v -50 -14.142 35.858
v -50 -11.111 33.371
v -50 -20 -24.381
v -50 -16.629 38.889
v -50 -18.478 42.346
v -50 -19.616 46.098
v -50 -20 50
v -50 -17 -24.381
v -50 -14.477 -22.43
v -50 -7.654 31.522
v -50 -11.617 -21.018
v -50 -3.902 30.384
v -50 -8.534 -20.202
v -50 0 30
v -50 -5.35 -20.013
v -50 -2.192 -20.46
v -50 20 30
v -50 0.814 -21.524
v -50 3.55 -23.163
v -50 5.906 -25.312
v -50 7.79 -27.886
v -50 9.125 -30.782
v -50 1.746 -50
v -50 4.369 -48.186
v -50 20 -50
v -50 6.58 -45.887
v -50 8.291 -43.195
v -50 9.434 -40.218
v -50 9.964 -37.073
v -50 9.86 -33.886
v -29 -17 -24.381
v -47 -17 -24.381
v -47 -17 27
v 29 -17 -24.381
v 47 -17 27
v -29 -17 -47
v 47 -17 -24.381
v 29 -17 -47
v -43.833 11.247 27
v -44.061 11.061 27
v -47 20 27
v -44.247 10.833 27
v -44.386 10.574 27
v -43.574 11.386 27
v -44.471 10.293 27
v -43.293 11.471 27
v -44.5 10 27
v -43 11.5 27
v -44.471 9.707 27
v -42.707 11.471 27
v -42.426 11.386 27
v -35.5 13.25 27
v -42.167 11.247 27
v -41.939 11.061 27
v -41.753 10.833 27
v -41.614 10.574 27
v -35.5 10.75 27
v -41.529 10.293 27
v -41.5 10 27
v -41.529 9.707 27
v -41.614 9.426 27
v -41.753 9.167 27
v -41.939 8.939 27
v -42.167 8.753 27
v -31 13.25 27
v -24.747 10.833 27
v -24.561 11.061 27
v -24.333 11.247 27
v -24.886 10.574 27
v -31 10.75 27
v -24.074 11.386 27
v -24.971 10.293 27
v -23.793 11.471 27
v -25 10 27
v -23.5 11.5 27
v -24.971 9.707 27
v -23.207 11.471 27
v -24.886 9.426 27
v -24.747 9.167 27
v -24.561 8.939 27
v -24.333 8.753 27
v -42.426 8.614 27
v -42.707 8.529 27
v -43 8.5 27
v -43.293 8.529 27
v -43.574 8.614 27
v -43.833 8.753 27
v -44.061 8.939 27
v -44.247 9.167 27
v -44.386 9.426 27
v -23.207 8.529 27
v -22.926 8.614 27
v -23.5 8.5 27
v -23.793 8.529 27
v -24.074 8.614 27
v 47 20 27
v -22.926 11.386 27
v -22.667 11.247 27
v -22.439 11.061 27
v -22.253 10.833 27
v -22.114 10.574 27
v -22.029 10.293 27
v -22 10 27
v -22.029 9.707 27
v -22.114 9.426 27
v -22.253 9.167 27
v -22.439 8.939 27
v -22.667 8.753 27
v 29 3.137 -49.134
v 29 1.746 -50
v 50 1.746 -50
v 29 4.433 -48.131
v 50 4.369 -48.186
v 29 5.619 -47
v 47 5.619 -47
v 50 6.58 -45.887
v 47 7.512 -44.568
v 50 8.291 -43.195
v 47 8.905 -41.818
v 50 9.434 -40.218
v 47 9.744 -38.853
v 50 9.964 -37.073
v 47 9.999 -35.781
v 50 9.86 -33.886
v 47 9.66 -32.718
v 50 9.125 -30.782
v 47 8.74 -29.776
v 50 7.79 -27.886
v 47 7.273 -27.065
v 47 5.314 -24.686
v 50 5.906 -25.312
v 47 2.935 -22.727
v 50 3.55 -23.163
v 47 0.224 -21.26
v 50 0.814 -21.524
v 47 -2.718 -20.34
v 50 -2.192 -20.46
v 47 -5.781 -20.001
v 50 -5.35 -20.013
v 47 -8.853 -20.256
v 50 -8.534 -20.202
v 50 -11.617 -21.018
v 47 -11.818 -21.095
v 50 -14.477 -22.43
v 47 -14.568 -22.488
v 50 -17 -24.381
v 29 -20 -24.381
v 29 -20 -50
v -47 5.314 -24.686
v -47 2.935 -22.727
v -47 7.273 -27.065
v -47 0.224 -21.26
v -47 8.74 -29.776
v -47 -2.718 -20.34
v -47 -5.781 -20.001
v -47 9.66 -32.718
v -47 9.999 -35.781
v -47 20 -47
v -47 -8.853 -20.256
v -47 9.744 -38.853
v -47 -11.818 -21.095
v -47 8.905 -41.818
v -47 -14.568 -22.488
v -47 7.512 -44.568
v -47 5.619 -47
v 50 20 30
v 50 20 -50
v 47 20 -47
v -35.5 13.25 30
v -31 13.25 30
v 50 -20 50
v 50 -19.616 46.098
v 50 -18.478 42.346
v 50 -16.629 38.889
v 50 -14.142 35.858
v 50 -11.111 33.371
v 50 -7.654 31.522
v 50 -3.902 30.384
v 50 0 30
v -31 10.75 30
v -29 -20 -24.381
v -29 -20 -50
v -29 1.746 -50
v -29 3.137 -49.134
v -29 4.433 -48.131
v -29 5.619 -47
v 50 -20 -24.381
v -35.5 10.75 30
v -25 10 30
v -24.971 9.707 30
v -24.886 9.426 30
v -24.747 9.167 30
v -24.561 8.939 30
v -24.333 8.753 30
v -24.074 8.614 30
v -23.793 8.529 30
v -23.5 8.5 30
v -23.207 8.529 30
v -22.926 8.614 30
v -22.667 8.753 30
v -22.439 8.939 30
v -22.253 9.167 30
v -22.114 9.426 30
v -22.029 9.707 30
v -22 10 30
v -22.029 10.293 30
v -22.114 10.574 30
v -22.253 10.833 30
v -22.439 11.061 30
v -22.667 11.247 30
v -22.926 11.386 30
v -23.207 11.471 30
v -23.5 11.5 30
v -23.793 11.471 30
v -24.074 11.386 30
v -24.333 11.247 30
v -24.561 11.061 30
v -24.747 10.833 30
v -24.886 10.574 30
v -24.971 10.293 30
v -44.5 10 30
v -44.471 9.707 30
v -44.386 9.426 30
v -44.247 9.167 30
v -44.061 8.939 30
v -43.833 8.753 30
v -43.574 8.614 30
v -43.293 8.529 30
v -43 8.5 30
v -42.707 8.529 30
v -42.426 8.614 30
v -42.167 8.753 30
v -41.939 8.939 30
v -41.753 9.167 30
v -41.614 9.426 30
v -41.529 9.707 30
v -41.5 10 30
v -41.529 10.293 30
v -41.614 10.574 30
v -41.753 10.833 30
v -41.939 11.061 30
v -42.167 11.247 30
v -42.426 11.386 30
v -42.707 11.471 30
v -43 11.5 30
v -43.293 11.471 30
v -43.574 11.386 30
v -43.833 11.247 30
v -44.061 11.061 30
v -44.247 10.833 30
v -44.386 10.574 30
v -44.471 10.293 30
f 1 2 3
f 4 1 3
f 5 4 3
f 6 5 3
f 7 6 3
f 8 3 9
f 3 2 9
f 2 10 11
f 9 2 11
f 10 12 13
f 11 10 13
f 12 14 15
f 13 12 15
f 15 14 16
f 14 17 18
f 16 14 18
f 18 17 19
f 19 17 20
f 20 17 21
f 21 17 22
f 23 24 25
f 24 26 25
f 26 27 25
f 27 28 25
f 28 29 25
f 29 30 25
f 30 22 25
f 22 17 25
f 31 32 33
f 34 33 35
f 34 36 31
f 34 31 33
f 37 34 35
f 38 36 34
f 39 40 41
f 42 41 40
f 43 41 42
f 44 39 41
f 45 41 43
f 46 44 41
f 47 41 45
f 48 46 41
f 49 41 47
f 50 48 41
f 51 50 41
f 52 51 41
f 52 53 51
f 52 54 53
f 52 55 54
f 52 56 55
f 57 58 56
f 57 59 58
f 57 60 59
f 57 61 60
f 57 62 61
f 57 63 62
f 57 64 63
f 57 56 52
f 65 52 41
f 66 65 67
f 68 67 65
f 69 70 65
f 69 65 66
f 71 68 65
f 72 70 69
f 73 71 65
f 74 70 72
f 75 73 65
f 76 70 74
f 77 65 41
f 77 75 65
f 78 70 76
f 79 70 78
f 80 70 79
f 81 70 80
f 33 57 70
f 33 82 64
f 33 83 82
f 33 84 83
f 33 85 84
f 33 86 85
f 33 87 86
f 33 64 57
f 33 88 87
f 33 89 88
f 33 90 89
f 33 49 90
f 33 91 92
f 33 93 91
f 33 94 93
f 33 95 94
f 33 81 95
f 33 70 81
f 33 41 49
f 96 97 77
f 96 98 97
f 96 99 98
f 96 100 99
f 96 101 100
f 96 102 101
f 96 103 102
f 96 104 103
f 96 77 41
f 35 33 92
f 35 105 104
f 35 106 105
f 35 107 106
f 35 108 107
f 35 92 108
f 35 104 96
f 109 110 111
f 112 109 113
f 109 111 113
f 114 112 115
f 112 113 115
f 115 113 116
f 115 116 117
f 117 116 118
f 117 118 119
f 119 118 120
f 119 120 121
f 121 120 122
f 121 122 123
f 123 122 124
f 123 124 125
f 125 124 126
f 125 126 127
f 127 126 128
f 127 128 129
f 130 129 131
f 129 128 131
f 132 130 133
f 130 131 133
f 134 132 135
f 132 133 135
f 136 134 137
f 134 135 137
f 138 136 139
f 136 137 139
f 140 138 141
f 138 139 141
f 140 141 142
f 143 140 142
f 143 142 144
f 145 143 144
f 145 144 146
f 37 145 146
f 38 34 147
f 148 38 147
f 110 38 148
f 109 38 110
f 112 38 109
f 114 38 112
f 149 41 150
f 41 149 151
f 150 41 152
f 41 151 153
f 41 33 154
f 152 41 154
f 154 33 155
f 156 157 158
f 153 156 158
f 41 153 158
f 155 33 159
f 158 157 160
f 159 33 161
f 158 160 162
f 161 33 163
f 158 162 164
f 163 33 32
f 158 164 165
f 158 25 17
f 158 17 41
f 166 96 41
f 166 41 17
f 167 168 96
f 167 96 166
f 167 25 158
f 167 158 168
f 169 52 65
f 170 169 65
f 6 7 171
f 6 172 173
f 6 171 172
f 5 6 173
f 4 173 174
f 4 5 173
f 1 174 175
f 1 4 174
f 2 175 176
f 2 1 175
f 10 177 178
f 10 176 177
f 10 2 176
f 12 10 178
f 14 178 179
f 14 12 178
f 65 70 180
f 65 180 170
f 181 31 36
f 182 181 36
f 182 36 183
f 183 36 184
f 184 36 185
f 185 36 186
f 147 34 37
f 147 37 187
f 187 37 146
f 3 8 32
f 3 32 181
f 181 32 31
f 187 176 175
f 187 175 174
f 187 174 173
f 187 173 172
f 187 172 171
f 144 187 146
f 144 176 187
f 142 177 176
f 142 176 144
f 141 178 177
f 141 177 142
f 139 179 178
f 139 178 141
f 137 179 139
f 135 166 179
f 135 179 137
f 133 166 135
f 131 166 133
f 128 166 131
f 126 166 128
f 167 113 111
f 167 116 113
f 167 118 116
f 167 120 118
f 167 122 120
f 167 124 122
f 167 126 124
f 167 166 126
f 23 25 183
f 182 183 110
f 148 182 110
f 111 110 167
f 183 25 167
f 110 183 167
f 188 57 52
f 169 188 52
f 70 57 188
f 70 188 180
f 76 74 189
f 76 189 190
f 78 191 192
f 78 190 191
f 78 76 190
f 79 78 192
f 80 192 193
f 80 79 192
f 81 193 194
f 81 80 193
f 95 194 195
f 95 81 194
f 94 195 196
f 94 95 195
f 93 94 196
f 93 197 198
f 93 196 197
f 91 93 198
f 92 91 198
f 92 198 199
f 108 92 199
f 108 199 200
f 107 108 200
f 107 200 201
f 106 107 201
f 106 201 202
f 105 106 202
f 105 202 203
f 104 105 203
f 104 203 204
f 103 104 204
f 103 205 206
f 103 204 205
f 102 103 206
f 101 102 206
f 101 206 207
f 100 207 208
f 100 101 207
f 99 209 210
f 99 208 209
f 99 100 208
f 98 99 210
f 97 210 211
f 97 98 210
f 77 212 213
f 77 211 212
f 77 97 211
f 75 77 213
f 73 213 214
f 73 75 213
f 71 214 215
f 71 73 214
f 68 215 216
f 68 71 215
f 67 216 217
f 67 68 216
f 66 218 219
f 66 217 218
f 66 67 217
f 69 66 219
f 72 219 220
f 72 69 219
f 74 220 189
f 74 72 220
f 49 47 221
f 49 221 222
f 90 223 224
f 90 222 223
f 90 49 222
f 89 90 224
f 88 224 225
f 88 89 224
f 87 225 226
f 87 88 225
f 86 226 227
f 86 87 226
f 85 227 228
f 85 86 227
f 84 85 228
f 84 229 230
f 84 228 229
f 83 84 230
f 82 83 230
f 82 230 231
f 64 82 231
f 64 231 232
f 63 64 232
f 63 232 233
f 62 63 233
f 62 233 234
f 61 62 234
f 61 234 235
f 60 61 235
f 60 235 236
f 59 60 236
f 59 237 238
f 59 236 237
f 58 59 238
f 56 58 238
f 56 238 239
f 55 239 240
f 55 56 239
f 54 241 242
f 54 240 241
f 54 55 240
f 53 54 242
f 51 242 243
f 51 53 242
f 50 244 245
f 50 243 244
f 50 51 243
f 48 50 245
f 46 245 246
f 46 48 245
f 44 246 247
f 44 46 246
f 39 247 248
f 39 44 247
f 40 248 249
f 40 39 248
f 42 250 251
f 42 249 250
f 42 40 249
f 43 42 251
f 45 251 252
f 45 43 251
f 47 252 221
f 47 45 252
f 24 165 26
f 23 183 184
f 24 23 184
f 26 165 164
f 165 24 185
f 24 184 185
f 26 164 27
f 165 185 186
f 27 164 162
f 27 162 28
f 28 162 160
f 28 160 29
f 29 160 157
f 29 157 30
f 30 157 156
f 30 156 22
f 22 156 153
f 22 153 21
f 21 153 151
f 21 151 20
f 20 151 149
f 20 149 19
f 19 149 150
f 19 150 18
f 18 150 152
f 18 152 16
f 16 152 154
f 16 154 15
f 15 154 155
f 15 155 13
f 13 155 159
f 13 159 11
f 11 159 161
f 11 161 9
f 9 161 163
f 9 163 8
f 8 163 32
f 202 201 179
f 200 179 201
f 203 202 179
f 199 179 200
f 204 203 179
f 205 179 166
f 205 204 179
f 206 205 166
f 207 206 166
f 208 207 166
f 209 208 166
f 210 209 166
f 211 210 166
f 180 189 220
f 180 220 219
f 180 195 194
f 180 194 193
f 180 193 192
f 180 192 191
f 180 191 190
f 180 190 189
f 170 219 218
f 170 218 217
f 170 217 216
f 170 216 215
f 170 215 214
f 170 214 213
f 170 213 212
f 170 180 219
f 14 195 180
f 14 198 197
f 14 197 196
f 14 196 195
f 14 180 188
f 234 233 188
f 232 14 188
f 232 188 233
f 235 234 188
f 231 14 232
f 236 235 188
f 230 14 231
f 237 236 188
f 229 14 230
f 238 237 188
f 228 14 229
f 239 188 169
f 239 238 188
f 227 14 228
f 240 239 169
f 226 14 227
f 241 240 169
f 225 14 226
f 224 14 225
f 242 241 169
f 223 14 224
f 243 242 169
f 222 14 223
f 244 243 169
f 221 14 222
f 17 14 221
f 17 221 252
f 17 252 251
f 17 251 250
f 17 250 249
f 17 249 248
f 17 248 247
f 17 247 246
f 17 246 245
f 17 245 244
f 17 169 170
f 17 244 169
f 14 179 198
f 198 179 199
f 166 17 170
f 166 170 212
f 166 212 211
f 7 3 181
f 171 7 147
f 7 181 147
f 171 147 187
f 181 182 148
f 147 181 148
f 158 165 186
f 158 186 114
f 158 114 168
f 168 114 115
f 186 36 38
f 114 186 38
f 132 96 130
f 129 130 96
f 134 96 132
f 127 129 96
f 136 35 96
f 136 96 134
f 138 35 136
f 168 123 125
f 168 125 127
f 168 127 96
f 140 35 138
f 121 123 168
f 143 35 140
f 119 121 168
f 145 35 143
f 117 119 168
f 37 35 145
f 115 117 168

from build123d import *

# Parameters (mm, degrees)
ESBO_O1_W                  = 100
ESBO_O1_H                  = 100
RESSALTO_EXTRUS_O1_DEPTH   = 20
CORTE_EXTRUS_O1_DEPTH      = 74.484692283
CORTE_EXTRUS_O1_DEPTH_BACK = 74.484692283
ESBO_O2_R                  = 20
ESBO_O3_W                  = 94
ESBO_O3_H                  = 74
CORTE_EXTRUS_O2_DEPTH      = 74.484692283
ESBO_O5_W                  = 94
ESBO_O5_H                  = 74
CORTE_EXTRUS_O3_DEPTH      = 17
CORTE_EXTRUS_O4_START      = 50
ESBO_O6_R                  = 16
CORTE_EXTRUS_O4_DEPTH      = 21
CORTE_EXTRUS_O5_START      = -29
ESBO_O6_4_R                = 16
CORTE_EXTRUS_O5_DEPTH      = 21
ESBO_O7_W                  = 21
ESBO_O7_H                  = 3.872983347
CORTE_EXTRUS_O6_DEPTH      = 21
ESBO_O8_R                  = 1.5
ESBO_O8_W                  = 4.5
ESBO_O8_H                  = 2.5
CORTE_EXTRUS_O8_DEPTH      = 74.484692283


with BuildPart() as part:
    # Esboço1 → Ressalto-extrusão1 (new, symmetric)
    with BuildSketch(Plane(origin=(0, 0, 0), x_dir=(1, 0, 0), z_dir=(0, 1, 0))):
        Rectangle(ESBO_O1_W, ESBO_O1_H)
    extrude(amount=RESSALTO_EXTRUS_O1_DEPTH, both=True)

    # Esboço2 → Corte-extrusão1 (cut, two sides: drawn at the far end of the back side and taken through both)
    with BuildSketch(Plane(origin=(0, 0, 0), x_dir=(0, 0, -1), z_dir=(1, 0, 0)).offset(-CORTE_EXTRUS_O1_DEPTH_BACK)):
        with BuildLine():
            Line((-30, 20), (-50, 20))
            ThreePointArc((-50, 20), (-35.857864376, 14.142135624), (-30, 0))
            Line((-30, 0), (-30, 20))
        make_face()
        with Locations((-50, 0)):
            Circle(ESBO_O2_R)
    extrude(amount=CORTE_EXTRUS_O1_DEPTH + CORTE_EXTRUS_O1_DEPTH_BACK, mode=Mode.SUBTRACT)

    # Esboço3 → Corte-extrusão2 (cut, through all)
    with BuildSketch(Plane(origin=(0, 0, 0), x_dir=(1, 0, 0), z_dir=(0, 1, 0))):
        with Locations((0, 10)):
            Rectangle(ESBO_O3_W, ESBO_O3_H)
    extrude(amount=CORTE_EXTRUS_O2_DEPTH, mode=Mode.SUBTRACT)

    # Esboço5 → Corte-extrusão3 (cut)
    with BuildSketch(Plane(origin=(0, 0, 0), x_dir=(1, 0, 0), z_dir=(0, 1, 0))):
        with Locations((0, 10)):
            Rectangle(ESBO_O5_W, ESBO_O5_H)
    extrude(amount=-CORTE_EXTRUS_O3_DEPTH, mode=Mode.SUBTRACT)

    # Esboço6 → Corte-extrusão4 (cut)
    with BuildSketch(Plane(origin=(0, 0, 0), x_dir=(0, 0, -1), z_dir=(1, 0, 0)).offset(CORTE_EXTRUS_O4_START)):
        with Locations((36, -6)):
            Circle(ESBO_O6_R)
        with BuildLine():
            ThreePointArc((52, -6), (47.313708499, -17.313708499), (36, -22))
            Line((36, -22), (52, -22))
            Line((52, -22), (52, -6))
        make_face()
    extrude(amount=-CORTE_EXTRUS_O4_DEPTH, mode=Mode.SUBTRACT)

    # Esboço6<4> → Corte-extrusão5 (cut)
    with BuildSketch(Plane(origin=(0, 0, 0), x_dir=(0, 0, -1), z_dir=(1, 0, 0)).offset(CORTE_EXTRUS_O5_START)):
        with BuildLine():
            ThreePointArc((52, -6), (47.313708499, -17.313708499), (36, -22))
            Line((36, -22), (52, -22))
            Line((52, -22), (52, -6))
        make_face()
        with Locations((36, -6)):
            Circle(ESBO_O6_4_R)
    extrude(amount=-CORTE_EXTRUS_O5_DEPTH, mode=Mode.SUBTRACT)

    # Esboço7 → Corte-extrusão6 (cut)
    with BuildSketch(Plane(origin=(0, 0, 0), x_dir=(1, 0, 0), z_dir=(0, 1, 0))):
        with Locations((-39.5, 26.317541635)):
            Rectangle(ESBO_O7_W, ESBO_O7_H)
        with Locations((39.5, 26.317541635)):
            Rectangle(ESBO_O7_W, ESBO_O7_H)
    extrude(amount=-CORTE_EXTRUS_O6_DEPTH, mode=Mode.SUBTRACT)

    # Esboço8 → Corte-extrusão8 (cut, through all)
    with BuildSketch(Plane.XY):
        with Locations(Location((-43, 10, 0), (0, 0, 180))):
            Circle(ESBO_O8_R)
        with Locations(Location((-23.5, 10, 0), (0, 0, 180))):
            Circle(ESBO_O8_R)
        with Locations((-33.25, 12)):
            Rectangle(ESBO_O8_W, ESBO_O8_H)
    extrude(amount=CORTE_EXTRUS_O8_DEPTH, mode=Mode.SUBTRACT)


solid = part.part
